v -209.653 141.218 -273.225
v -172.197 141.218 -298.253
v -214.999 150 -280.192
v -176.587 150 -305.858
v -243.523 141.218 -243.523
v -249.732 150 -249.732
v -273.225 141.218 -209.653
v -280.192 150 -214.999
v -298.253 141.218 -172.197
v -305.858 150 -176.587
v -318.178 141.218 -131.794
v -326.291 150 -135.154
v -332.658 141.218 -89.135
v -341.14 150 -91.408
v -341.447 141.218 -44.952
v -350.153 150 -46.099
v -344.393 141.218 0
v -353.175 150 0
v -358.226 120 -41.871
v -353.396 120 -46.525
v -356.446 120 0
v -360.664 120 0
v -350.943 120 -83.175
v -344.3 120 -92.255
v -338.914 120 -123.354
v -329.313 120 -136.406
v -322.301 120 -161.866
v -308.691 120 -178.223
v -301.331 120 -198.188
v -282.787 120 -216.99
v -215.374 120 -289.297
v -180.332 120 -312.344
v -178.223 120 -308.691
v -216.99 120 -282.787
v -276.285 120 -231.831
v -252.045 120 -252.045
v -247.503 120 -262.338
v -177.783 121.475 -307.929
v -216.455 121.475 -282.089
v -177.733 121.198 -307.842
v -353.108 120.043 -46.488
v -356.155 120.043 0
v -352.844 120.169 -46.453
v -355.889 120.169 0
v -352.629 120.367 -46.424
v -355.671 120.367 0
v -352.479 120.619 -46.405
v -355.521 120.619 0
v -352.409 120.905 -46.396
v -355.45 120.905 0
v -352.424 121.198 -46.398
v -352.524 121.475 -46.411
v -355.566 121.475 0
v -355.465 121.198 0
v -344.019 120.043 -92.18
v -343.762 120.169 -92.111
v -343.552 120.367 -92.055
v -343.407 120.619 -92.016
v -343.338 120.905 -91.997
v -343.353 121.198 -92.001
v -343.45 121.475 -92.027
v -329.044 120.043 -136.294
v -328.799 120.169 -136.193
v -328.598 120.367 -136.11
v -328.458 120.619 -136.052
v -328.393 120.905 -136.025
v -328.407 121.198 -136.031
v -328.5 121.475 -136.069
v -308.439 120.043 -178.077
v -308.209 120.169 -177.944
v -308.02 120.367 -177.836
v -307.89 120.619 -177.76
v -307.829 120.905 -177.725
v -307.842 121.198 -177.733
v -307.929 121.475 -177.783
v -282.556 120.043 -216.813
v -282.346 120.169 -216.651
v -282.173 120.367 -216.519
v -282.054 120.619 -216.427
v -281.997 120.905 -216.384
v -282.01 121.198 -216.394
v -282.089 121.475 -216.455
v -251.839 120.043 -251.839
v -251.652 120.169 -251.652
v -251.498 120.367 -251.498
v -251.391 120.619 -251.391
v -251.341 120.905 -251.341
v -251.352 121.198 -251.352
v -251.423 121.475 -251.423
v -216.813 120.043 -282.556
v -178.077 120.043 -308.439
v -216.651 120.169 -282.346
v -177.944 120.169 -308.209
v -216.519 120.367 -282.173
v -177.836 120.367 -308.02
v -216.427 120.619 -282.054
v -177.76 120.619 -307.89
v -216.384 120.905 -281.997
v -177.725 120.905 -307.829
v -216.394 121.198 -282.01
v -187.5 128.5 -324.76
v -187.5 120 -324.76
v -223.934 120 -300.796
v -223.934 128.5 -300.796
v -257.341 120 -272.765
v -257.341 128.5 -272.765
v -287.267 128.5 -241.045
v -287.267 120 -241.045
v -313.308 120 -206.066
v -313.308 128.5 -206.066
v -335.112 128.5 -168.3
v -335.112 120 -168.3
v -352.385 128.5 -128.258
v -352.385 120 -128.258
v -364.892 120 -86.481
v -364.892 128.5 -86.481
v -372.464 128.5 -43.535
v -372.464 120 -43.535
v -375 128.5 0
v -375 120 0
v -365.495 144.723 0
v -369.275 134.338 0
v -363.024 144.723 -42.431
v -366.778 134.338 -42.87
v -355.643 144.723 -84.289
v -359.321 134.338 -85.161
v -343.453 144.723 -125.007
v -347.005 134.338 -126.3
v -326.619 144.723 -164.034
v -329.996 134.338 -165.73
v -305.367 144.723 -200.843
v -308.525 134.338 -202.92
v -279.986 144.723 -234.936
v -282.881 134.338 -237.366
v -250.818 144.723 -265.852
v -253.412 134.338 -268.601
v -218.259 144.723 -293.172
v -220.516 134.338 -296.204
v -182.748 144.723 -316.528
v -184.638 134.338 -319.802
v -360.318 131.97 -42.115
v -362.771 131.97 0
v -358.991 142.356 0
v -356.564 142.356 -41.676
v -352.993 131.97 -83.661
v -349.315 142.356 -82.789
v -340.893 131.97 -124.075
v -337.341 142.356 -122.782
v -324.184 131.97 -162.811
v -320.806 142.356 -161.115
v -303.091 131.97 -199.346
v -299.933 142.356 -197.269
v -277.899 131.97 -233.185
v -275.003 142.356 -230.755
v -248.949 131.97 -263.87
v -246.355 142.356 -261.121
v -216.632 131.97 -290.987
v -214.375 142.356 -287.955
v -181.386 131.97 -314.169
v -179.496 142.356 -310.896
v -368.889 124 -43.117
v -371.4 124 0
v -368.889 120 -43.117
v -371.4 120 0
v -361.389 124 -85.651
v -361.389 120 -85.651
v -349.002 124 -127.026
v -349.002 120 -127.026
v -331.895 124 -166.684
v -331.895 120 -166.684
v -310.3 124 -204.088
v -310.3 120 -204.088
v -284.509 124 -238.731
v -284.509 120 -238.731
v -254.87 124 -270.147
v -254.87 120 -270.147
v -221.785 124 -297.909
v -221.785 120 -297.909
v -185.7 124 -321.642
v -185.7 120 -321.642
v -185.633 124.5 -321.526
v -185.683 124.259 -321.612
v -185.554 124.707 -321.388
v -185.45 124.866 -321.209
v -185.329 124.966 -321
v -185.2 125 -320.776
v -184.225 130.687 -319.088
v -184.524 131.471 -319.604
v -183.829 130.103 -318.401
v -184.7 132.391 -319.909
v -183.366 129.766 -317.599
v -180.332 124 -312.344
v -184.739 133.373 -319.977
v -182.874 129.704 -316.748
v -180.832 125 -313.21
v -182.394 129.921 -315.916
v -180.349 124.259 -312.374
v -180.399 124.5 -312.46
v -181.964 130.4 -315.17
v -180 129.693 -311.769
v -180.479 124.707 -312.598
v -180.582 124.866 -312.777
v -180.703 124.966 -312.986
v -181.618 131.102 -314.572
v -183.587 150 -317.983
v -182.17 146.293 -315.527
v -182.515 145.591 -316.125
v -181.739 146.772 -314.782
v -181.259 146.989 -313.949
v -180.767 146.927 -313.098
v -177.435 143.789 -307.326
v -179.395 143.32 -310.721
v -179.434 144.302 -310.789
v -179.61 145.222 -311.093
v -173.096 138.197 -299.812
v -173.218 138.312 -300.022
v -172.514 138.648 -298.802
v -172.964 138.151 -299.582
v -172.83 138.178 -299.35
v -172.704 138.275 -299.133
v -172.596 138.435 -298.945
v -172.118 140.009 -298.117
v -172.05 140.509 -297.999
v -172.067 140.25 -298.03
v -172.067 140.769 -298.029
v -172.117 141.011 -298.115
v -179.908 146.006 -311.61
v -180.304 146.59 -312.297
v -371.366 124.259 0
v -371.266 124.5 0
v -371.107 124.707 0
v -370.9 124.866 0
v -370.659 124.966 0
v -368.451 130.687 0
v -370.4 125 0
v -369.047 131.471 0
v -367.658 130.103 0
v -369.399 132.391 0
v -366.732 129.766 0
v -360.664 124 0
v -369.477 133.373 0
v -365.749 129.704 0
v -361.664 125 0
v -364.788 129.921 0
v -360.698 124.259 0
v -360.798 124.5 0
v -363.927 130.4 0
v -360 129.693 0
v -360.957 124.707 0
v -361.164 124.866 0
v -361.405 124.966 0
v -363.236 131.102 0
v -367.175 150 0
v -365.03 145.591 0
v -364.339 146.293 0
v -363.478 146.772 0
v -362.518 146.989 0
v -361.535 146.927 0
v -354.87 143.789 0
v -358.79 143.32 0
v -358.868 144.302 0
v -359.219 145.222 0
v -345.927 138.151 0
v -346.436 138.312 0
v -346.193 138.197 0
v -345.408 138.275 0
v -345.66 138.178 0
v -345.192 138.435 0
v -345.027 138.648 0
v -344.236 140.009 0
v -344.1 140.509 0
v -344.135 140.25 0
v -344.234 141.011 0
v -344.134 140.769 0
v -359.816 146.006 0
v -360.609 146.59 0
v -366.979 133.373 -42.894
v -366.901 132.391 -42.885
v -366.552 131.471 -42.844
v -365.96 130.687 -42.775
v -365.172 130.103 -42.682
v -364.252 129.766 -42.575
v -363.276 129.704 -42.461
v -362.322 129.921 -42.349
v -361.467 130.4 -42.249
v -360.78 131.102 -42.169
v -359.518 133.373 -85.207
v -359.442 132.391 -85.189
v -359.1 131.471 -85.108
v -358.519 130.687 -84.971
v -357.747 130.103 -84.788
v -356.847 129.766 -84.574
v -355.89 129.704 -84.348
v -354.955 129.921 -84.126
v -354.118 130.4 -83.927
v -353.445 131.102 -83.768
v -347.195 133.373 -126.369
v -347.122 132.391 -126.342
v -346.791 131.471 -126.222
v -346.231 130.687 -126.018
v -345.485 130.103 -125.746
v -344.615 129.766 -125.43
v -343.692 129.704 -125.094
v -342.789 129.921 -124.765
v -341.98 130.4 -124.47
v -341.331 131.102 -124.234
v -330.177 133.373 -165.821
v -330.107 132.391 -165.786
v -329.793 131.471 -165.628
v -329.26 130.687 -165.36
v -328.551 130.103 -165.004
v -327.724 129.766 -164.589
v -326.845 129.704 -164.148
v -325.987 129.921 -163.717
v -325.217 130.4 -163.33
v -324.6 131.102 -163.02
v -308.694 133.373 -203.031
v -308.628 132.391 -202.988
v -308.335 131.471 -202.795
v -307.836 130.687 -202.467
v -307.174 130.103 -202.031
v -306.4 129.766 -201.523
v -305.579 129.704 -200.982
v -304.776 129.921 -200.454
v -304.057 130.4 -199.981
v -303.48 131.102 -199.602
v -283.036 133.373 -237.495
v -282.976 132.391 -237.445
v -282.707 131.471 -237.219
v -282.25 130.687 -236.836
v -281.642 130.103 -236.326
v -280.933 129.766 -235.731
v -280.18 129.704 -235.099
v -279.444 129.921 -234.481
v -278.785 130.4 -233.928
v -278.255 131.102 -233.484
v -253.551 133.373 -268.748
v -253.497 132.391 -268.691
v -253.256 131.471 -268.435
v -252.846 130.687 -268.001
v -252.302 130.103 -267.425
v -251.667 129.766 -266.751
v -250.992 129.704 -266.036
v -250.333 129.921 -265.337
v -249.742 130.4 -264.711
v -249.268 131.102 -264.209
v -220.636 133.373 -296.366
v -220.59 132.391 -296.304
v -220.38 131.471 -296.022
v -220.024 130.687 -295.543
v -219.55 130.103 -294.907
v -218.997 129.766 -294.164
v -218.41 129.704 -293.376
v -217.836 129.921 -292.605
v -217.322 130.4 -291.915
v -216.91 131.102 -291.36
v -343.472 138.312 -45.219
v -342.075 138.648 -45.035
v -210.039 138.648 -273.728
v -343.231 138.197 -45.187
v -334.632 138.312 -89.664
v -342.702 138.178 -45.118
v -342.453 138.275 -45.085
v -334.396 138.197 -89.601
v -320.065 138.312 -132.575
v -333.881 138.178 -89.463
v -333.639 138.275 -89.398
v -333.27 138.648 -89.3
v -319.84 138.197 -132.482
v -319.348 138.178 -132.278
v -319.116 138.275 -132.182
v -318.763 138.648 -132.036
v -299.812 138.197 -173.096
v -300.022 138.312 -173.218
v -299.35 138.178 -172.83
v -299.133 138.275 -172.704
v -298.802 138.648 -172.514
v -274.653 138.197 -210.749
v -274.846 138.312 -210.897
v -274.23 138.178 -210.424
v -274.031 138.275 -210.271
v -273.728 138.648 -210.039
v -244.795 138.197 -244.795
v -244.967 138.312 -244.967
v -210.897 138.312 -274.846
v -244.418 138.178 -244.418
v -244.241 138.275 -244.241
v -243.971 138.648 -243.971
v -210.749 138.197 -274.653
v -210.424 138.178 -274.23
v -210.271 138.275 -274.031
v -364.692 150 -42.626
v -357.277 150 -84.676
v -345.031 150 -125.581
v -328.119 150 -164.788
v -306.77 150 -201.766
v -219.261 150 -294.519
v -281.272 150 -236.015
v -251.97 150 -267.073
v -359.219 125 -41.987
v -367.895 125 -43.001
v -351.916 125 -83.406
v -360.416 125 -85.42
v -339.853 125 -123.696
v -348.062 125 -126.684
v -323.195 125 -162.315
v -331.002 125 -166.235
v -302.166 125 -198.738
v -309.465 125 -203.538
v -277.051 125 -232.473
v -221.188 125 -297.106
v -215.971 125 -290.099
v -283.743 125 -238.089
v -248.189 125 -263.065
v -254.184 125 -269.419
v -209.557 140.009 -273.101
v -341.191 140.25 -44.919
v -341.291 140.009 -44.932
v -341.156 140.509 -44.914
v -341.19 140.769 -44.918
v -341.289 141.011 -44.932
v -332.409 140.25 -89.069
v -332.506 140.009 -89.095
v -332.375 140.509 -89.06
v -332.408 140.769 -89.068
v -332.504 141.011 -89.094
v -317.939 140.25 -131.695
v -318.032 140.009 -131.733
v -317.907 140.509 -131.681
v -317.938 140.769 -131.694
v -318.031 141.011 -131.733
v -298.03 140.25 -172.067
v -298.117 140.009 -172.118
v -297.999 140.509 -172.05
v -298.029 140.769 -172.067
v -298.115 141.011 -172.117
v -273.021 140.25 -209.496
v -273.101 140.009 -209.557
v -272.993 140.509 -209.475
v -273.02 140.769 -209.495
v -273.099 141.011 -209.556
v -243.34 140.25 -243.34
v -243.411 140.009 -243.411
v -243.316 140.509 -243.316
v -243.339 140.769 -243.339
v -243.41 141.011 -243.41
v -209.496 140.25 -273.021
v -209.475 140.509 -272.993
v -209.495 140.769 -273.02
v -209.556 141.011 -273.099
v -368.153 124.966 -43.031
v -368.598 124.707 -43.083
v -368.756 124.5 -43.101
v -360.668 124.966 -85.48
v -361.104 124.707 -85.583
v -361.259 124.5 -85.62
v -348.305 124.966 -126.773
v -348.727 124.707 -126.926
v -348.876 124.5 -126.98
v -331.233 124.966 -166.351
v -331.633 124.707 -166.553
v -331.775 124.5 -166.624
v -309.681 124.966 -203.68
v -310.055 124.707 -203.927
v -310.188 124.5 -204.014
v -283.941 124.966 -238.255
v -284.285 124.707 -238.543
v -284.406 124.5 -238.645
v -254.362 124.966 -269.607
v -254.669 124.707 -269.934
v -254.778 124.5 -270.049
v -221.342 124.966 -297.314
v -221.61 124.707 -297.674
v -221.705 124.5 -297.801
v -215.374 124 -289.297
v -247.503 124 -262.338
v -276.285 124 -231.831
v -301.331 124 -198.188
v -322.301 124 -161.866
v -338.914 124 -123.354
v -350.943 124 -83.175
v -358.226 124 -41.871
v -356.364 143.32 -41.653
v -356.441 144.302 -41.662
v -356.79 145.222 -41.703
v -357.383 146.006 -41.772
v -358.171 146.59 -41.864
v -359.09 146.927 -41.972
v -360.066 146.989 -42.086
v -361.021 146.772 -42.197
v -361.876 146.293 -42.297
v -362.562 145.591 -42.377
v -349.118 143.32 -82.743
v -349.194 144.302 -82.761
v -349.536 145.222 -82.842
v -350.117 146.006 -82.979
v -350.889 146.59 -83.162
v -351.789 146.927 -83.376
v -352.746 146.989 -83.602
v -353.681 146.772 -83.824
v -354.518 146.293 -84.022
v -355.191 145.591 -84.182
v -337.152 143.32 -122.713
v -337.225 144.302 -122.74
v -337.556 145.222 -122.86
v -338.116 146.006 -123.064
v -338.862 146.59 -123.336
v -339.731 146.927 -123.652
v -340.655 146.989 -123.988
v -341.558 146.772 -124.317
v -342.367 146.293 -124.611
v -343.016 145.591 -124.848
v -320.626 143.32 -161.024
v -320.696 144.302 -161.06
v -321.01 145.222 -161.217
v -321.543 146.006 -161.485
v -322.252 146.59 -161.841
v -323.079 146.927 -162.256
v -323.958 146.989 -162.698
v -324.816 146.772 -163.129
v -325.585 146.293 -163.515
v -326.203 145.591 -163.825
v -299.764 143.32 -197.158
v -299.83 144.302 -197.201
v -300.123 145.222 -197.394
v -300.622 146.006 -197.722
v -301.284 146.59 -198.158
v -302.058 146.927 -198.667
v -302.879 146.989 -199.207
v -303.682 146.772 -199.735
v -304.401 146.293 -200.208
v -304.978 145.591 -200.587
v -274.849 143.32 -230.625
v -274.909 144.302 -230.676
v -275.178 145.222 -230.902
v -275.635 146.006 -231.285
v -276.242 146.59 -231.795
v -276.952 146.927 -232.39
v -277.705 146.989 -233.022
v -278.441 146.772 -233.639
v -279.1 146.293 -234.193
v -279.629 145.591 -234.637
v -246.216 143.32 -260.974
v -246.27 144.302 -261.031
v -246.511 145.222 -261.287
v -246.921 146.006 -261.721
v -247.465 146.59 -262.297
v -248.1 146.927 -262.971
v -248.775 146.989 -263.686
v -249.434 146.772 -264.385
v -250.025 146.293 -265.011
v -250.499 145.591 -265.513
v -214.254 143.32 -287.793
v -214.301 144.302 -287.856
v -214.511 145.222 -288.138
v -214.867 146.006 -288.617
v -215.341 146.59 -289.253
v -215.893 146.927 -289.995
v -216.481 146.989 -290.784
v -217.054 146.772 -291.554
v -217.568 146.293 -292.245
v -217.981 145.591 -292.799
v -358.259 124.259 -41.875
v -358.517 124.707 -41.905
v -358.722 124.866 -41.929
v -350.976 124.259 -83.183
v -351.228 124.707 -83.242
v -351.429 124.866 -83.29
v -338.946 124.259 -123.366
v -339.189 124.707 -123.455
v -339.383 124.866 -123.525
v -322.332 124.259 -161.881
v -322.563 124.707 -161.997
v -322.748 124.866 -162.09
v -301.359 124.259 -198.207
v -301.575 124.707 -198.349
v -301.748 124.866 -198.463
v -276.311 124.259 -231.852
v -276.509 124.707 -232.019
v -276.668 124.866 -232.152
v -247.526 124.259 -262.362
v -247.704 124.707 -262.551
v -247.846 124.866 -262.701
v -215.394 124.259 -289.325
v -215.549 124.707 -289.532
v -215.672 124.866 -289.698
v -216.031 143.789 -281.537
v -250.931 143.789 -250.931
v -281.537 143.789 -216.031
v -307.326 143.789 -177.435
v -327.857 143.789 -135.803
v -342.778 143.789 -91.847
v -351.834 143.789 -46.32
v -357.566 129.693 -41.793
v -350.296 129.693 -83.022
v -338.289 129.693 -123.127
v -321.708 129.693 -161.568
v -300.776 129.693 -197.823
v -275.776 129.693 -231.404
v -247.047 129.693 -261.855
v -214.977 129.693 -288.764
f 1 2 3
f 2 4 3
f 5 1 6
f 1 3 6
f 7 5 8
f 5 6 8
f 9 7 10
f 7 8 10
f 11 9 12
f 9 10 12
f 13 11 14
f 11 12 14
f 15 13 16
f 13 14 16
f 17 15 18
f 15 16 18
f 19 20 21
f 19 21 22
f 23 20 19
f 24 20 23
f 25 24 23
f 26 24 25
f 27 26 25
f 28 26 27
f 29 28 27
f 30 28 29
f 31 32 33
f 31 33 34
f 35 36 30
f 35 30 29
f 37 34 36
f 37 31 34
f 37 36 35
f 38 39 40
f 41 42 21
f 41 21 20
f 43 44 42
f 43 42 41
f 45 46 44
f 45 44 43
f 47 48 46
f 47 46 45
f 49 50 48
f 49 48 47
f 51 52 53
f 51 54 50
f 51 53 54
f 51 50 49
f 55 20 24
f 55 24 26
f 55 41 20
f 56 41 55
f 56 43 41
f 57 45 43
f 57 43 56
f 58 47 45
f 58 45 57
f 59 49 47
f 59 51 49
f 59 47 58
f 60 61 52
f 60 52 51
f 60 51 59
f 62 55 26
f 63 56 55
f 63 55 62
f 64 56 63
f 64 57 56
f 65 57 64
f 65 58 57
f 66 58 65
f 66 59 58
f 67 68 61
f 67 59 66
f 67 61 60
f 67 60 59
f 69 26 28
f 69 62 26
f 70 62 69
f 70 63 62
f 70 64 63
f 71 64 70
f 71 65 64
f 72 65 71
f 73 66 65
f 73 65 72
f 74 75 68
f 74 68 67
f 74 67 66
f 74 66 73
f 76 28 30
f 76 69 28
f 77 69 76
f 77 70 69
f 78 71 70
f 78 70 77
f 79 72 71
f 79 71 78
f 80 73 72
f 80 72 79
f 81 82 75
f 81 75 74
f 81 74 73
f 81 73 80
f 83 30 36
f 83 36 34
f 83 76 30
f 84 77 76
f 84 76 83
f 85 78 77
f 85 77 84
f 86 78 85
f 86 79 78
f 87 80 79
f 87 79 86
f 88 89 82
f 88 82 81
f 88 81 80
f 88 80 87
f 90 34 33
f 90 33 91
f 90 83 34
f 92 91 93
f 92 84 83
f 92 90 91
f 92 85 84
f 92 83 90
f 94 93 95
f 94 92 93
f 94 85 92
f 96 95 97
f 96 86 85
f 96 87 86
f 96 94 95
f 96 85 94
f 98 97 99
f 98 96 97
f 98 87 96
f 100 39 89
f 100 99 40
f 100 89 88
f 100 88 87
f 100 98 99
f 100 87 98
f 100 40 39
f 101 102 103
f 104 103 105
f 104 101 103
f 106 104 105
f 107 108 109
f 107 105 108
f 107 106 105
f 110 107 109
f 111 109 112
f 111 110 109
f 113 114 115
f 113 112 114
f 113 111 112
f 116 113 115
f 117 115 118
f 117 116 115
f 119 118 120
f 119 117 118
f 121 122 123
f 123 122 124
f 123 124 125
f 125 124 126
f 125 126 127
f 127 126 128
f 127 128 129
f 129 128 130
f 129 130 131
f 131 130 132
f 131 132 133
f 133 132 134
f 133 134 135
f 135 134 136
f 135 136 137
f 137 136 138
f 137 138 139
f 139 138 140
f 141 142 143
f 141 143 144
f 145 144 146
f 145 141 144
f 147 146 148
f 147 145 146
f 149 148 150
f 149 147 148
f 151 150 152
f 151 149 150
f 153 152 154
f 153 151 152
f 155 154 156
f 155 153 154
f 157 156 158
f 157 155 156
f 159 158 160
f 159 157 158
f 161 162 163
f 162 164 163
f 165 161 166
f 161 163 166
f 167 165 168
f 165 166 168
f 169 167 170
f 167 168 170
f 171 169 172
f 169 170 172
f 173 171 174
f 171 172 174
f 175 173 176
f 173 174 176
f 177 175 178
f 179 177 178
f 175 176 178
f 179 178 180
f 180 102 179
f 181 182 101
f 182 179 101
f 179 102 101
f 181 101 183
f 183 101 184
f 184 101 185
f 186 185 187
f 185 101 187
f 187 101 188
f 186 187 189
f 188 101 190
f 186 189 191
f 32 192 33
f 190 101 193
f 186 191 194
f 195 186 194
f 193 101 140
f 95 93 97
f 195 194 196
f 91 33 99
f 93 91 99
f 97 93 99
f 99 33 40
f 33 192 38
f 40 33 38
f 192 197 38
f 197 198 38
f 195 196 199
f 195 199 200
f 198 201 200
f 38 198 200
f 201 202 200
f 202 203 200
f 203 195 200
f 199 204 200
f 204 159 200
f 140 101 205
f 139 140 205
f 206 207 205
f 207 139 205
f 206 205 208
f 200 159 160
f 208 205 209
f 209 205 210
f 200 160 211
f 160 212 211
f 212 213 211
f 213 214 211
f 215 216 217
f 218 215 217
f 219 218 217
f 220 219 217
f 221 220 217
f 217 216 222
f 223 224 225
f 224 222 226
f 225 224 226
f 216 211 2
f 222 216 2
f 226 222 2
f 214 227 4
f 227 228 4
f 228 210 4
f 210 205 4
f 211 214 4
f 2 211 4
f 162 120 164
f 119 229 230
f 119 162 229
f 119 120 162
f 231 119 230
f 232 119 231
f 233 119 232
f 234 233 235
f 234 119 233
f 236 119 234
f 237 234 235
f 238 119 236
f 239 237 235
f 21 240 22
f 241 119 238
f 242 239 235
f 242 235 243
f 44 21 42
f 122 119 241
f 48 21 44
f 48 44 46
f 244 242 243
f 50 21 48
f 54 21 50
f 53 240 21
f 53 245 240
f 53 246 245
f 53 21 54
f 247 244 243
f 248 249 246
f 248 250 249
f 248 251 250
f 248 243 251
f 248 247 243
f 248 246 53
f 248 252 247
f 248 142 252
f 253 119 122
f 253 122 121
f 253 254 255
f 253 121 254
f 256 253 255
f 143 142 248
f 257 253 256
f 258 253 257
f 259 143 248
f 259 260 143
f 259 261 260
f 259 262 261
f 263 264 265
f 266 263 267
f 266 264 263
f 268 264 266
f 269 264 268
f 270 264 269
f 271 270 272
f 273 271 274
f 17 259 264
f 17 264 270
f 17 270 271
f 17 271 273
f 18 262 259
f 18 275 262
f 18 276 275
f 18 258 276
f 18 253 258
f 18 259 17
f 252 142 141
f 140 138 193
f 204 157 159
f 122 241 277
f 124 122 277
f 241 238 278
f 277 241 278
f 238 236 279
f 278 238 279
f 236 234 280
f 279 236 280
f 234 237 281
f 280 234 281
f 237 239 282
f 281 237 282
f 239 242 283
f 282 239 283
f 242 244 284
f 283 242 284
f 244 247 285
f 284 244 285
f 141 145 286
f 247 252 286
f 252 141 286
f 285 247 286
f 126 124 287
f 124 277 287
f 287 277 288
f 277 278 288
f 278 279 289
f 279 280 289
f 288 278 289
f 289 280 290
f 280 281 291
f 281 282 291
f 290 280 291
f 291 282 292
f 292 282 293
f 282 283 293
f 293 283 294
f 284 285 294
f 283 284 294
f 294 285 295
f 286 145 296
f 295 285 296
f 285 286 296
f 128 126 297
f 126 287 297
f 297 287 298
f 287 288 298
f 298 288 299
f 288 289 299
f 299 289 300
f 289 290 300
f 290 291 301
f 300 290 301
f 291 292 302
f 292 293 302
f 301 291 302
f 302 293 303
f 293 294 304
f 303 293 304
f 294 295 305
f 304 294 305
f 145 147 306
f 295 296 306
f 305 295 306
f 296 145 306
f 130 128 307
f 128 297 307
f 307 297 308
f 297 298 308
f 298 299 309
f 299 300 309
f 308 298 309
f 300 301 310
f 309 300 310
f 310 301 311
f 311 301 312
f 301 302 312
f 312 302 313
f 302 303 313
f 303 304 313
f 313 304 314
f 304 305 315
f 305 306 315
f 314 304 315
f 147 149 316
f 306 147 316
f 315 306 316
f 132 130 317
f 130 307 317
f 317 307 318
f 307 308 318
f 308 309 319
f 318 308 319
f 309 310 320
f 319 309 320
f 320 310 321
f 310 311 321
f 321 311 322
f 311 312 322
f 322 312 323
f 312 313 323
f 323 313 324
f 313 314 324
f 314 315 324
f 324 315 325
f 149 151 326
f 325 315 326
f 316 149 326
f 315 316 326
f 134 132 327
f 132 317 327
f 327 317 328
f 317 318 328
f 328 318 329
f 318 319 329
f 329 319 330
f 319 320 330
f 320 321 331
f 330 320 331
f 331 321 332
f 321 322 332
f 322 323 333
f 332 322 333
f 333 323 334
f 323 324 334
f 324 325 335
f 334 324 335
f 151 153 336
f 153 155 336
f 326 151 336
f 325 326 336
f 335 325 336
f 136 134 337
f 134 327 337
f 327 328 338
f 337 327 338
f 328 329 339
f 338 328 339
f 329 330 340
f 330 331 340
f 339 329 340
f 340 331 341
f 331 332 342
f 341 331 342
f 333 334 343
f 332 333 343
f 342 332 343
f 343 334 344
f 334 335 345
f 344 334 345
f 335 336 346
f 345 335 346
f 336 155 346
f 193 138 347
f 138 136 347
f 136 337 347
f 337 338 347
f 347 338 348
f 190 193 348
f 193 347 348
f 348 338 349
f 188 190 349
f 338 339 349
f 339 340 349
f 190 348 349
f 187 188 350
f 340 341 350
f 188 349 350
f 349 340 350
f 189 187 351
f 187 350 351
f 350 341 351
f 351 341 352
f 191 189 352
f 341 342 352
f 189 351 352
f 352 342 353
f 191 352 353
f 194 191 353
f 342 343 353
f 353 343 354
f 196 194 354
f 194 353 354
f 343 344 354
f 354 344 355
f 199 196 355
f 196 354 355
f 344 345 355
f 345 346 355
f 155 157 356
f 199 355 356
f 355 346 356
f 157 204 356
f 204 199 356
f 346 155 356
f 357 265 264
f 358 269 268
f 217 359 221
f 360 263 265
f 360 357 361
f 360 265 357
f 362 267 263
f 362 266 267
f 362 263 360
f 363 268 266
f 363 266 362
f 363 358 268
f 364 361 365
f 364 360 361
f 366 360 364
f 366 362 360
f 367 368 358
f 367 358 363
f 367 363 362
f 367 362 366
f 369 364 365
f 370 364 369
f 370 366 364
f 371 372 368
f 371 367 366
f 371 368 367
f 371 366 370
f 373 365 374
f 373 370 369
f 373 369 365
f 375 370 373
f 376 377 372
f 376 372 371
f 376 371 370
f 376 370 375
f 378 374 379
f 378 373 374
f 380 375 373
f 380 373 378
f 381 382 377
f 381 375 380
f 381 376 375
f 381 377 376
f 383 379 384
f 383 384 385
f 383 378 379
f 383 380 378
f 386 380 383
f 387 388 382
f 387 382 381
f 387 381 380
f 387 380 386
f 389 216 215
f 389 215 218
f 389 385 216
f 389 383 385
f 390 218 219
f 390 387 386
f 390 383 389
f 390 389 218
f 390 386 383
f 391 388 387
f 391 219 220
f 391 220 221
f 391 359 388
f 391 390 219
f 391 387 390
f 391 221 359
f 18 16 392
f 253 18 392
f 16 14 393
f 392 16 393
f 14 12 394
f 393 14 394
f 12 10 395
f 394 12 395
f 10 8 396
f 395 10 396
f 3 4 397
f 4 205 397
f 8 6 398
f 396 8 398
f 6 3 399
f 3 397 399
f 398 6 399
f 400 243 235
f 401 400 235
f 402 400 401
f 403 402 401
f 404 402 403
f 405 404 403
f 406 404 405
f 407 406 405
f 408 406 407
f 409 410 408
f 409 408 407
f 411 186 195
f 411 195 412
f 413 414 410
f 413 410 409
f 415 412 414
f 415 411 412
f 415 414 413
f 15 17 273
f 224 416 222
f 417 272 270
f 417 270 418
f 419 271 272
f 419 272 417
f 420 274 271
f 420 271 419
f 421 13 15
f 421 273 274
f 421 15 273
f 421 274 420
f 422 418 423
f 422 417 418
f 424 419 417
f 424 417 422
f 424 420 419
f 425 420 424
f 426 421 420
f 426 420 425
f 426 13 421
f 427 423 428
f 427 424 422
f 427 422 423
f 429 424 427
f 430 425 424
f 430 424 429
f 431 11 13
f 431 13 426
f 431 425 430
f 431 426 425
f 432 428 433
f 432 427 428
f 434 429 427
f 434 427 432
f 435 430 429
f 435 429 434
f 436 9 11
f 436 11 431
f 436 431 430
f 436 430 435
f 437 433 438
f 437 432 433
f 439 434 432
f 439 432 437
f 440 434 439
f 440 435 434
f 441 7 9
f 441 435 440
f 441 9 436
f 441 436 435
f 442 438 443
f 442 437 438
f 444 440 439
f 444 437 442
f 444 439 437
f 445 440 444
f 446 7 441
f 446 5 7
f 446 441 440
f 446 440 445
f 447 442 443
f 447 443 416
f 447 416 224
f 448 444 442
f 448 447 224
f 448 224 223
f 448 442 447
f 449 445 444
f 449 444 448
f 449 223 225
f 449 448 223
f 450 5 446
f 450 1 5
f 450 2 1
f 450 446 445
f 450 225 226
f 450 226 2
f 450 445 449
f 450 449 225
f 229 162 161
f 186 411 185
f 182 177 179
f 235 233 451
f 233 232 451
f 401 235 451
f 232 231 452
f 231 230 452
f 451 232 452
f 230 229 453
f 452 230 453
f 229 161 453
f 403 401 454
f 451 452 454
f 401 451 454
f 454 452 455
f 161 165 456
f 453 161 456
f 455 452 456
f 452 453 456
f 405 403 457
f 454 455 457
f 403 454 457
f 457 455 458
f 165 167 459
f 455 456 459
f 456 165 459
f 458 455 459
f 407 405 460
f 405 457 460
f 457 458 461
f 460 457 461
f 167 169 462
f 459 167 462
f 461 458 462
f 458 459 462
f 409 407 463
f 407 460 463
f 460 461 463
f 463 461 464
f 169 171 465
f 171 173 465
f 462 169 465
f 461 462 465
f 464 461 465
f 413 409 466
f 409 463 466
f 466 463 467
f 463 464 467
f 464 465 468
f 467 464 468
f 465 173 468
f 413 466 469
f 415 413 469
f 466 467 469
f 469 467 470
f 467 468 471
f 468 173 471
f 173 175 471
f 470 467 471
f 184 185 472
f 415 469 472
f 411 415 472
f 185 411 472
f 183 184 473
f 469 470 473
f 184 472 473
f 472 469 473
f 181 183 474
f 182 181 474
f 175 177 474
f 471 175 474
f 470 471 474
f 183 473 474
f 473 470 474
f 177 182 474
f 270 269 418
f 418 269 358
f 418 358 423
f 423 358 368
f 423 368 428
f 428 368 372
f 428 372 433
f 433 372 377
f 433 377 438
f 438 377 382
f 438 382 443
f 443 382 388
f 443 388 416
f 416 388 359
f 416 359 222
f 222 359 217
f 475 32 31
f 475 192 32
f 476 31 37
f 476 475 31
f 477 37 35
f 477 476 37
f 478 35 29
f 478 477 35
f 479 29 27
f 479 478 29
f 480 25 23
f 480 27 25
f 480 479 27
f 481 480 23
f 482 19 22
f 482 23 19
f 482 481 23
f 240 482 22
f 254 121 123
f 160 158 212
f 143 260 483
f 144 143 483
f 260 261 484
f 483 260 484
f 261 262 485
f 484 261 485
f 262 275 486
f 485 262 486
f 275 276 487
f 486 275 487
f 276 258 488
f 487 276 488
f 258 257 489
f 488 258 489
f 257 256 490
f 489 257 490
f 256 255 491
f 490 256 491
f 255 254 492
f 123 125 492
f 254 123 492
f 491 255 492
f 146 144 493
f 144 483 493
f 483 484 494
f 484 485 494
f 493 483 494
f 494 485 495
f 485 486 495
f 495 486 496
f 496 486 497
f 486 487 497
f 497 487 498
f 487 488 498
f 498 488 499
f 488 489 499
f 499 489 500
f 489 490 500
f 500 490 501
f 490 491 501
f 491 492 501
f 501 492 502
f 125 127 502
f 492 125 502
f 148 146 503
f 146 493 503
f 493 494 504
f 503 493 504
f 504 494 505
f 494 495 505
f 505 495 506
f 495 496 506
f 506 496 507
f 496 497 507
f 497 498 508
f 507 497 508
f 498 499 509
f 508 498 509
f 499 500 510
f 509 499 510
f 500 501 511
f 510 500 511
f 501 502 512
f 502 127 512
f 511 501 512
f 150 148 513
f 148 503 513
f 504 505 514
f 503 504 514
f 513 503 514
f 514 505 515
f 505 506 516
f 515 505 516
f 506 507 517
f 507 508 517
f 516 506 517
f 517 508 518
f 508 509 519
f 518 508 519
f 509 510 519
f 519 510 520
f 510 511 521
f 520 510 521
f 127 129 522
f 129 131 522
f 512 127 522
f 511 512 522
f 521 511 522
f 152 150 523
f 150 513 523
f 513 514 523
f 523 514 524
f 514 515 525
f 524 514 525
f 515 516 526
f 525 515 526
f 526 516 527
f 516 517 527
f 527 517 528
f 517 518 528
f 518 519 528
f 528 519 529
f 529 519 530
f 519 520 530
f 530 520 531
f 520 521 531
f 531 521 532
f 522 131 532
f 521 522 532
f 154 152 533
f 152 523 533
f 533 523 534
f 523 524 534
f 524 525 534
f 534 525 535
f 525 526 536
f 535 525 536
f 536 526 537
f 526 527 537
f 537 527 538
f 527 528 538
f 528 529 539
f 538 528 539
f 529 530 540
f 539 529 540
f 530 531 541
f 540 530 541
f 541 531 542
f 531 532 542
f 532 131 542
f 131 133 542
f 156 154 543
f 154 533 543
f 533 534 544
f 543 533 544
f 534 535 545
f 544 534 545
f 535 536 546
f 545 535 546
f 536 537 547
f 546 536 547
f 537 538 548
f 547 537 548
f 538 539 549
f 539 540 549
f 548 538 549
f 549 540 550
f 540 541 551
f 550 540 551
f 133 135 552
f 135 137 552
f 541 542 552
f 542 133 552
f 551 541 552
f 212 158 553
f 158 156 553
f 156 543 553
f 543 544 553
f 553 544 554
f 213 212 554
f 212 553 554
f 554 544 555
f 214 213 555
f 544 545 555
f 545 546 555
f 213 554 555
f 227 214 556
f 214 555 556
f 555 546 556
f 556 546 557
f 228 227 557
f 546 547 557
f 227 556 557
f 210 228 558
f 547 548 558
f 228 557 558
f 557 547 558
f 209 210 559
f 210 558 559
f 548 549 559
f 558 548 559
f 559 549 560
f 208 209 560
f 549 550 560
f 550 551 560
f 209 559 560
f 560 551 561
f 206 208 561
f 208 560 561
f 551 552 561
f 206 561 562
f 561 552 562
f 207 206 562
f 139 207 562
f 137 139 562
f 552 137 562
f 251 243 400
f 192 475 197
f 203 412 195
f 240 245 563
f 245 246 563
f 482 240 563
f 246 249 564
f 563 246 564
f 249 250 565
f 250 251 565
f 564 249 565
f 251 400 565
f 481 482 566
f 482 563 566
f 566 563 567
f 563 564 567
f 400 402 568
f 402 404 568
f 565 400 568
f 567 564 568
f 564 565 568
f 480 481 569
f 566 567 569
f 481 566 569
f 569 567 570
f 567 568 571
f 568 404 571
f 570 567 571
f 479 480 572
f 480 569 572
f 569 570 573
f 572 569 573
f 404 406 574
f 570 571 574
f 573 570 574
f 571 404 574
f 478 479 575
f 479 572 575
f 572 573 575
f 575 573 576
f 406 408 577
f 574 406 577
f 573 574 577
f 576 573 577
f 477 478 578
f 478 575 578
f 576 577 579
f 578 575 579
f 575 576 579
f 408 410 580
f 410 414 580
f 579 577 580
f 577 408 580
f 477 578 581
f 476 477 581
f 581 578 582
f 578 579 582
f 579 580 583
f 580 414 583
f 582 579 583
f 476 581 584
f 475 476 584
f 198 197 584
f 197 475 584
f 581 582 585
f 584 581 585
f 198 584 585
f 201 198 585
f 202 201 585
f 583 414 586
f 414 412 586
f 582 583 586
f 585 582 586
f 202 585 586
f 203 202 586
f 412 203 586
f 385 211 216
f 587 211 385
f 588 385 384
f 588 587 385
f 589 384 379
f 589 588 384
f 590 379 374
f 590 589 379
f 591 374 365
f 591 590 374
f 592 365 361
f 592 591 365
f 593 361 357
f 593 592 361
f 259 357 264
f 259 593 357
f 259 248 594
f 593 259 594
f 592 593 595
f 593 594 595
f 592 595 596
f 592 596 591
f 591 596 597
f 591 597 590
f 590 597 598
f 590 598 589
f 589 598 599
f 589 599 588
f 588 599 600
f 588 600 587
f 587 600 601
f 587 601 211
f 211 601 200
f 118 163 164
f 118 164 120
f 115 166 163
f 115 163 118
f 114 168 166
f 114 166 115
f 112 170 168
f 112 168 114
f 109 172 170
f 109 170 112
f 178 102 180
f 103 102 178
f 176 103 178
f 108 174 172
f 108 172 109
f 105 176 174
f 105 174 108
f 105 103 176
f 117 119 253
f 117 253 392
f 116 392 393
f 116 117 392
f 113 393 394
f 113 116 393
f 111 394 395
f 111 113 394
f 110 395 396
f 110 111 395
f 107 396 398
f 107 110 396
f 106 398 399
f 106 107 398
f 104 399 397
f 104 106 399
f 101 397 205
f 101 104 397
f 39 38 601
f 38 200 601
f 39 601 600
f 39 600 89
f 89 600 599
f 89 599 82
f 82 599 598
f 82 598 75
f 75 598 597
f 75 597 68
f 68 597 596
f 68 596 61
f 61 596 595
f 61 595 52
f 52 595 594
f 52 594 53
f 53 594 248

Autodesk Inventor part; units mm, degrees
ref_plane "YZ Plane" through (0, 0, 0) normal (1, 0, 0) x (0, 1, 0)
ref_plane "XZ Plane" through (0, 0, 0) normal (0, 1, 0) x (-1, 0, 0)
ref_plane "XY Plane" through (0, 0, 0) normal (0, 0, 1) x (1, 0, 0)
sketch "Skizze1" plane through (0, 0, 0) normal (0, 0, 1) x (1, 0, 0)
  arc A0 (-370.4, 125) -> (-371.4, 124) centre (-370.4, 124) ccw
  line L0 (-361.6643, 125) -> (-370.4, 125)
  arc A1 (-360.6643, 124) -> (-361.6643, 125) centre (-361.6643, 124) ccw
  line L1 (-360.6643, 120) -> (-360.6643, 124)
  arc A2 (-346.4361, 138.3117) -> (-345.027, 138.6477) centre (-345.8915, 139.1504) ccw
  line L2 (-344.2357, 140.0086) -> (-345.027, 138.6477)
  arc A3 (-344.2357, 140.0086) -> (-344.3931, 141.2184) centre (-345.1002, 140.5113) ccw
  line L3 (-353.1746, 150) -> (-344.3931, 141.2184)
  line L4 (-367.1746, 150) -> (-353.1746, 150)
  line L5 (-375, 128.5) -> (-367.1746, 150)
  line L6 (-375, 120) -> (-375, 128.5)
  line L7 (-371.4, 120) -> (-375, 120)
  line L8 (-371.4, 124) -> (-371.4, 120)
  line L9 (-357.3008, 147) -> (-364.6666, 147) construction
  line L10 (-364.6666, 147) -> (-371.4, 128.5) construction
  line L11 (0, 0) -> (-360, 0) construction
  line L12 (-356.9218, 138.1504) -> (-345, 0) construction
  line L13 (-356.9218, 138.1504) -> (0, 138.1504) construction
  line L14 (0, 138.1504) -> (0, 0) construction
  line L15 (-360, 129.6932) -> (-360, 0) construction
  line L16 (0, 0) -> (-225, 0) construction
  line L17 (-225, 0) -> (-225, 50) construction
  line L18 (-225, 50) -> (0, 50) construction
  line L19 (0, 50) -> (0, 0) construction
  line L20 (-346.4361, 138.3117) -> (-354.8697, 143.7886)
  line L21 (-360, 129.6932) -> (-355.5655, 121.4749)
  arc A4 (-356.4455, 120) -> (-355.5655, 121.4749) centre (-356.4455, 121) ccw
  line L22 (-225, 0) -> (-345, 0) construction
  line L23 (-345, 0) -> (-345, 35) construction
  line L24 (-345, 35) -> (-225, 35) construction
  line L25 (-225, 35) -> (-225, 0) construction
  line L26 (-356.4455, 120) -> (-360.6643, 120)
  line L27 (-354.8697, 143.7886) -> (-360, 129.6932)
  line L28 (-356.9218, 138.1504) -> (0, 8.2415) construction
  line L29 (-363.6, 129.6932) -> (-357.3008, 147) construction
  line L30 (-360, 129.6932) -> (-374.5657, 129.6932) construction
  line L31 (-363.6, 129.6932) -> (-358.3696, 120) construction
  line L32 (-344.2357, 140.0086) -> (-355.581, 120.4973) construction
  arc A5 (-358.9913, 142.3556) -> (-365.4954, 144.7229) centre (-362.2433, 143.5392) ccw
  arc A6 (-369.2753, 134.3376) -> (-362.7712, 131.9703) centre (-366.0232, 133.1539) ccw
  line L33 (-365.4954, 144.7229) -> (-369.2753, 134.3376)
  line L34 (-358.9913, 142.3556) -> (-362.7712, 131.9703)
  line L35 (-371.4, 120) -> (-371.4, 128.5) construction
  dimension "d1" = 30
  dimension "d5" = 1
  dimension "d6" = 1
  dimension "d9" = 135
  dimension "d14" = 8.5
  dimension "d18" = 360
  dimension "d25" = 50
  dimension "d26" = 225
  dimension "d31" = 14
  dimension "d40" = 3.5
  dimension "d41" = 120
  dimension "d42" = 35
  dimension "d43" = 1
  dimension "d47" = 6
  dimension "d50" = 65.068
  dimension "d54" = 15
  dimension "d55" = 3
  dimension "d59" = 12
  dimension "d60" = 160
  dimension "d61" = 120
  dimension "d63" = 3.6
  dimension "d64" = 3.6
  dimension "d65" = 5
  dimension "d66" = 15
revolve "Umdrehung1" add sketch "Skizze1" angle 60 about axis through (0, 138.1504, 0) along (0, -1, 0)
properties part number "LED-Ring_Element"
